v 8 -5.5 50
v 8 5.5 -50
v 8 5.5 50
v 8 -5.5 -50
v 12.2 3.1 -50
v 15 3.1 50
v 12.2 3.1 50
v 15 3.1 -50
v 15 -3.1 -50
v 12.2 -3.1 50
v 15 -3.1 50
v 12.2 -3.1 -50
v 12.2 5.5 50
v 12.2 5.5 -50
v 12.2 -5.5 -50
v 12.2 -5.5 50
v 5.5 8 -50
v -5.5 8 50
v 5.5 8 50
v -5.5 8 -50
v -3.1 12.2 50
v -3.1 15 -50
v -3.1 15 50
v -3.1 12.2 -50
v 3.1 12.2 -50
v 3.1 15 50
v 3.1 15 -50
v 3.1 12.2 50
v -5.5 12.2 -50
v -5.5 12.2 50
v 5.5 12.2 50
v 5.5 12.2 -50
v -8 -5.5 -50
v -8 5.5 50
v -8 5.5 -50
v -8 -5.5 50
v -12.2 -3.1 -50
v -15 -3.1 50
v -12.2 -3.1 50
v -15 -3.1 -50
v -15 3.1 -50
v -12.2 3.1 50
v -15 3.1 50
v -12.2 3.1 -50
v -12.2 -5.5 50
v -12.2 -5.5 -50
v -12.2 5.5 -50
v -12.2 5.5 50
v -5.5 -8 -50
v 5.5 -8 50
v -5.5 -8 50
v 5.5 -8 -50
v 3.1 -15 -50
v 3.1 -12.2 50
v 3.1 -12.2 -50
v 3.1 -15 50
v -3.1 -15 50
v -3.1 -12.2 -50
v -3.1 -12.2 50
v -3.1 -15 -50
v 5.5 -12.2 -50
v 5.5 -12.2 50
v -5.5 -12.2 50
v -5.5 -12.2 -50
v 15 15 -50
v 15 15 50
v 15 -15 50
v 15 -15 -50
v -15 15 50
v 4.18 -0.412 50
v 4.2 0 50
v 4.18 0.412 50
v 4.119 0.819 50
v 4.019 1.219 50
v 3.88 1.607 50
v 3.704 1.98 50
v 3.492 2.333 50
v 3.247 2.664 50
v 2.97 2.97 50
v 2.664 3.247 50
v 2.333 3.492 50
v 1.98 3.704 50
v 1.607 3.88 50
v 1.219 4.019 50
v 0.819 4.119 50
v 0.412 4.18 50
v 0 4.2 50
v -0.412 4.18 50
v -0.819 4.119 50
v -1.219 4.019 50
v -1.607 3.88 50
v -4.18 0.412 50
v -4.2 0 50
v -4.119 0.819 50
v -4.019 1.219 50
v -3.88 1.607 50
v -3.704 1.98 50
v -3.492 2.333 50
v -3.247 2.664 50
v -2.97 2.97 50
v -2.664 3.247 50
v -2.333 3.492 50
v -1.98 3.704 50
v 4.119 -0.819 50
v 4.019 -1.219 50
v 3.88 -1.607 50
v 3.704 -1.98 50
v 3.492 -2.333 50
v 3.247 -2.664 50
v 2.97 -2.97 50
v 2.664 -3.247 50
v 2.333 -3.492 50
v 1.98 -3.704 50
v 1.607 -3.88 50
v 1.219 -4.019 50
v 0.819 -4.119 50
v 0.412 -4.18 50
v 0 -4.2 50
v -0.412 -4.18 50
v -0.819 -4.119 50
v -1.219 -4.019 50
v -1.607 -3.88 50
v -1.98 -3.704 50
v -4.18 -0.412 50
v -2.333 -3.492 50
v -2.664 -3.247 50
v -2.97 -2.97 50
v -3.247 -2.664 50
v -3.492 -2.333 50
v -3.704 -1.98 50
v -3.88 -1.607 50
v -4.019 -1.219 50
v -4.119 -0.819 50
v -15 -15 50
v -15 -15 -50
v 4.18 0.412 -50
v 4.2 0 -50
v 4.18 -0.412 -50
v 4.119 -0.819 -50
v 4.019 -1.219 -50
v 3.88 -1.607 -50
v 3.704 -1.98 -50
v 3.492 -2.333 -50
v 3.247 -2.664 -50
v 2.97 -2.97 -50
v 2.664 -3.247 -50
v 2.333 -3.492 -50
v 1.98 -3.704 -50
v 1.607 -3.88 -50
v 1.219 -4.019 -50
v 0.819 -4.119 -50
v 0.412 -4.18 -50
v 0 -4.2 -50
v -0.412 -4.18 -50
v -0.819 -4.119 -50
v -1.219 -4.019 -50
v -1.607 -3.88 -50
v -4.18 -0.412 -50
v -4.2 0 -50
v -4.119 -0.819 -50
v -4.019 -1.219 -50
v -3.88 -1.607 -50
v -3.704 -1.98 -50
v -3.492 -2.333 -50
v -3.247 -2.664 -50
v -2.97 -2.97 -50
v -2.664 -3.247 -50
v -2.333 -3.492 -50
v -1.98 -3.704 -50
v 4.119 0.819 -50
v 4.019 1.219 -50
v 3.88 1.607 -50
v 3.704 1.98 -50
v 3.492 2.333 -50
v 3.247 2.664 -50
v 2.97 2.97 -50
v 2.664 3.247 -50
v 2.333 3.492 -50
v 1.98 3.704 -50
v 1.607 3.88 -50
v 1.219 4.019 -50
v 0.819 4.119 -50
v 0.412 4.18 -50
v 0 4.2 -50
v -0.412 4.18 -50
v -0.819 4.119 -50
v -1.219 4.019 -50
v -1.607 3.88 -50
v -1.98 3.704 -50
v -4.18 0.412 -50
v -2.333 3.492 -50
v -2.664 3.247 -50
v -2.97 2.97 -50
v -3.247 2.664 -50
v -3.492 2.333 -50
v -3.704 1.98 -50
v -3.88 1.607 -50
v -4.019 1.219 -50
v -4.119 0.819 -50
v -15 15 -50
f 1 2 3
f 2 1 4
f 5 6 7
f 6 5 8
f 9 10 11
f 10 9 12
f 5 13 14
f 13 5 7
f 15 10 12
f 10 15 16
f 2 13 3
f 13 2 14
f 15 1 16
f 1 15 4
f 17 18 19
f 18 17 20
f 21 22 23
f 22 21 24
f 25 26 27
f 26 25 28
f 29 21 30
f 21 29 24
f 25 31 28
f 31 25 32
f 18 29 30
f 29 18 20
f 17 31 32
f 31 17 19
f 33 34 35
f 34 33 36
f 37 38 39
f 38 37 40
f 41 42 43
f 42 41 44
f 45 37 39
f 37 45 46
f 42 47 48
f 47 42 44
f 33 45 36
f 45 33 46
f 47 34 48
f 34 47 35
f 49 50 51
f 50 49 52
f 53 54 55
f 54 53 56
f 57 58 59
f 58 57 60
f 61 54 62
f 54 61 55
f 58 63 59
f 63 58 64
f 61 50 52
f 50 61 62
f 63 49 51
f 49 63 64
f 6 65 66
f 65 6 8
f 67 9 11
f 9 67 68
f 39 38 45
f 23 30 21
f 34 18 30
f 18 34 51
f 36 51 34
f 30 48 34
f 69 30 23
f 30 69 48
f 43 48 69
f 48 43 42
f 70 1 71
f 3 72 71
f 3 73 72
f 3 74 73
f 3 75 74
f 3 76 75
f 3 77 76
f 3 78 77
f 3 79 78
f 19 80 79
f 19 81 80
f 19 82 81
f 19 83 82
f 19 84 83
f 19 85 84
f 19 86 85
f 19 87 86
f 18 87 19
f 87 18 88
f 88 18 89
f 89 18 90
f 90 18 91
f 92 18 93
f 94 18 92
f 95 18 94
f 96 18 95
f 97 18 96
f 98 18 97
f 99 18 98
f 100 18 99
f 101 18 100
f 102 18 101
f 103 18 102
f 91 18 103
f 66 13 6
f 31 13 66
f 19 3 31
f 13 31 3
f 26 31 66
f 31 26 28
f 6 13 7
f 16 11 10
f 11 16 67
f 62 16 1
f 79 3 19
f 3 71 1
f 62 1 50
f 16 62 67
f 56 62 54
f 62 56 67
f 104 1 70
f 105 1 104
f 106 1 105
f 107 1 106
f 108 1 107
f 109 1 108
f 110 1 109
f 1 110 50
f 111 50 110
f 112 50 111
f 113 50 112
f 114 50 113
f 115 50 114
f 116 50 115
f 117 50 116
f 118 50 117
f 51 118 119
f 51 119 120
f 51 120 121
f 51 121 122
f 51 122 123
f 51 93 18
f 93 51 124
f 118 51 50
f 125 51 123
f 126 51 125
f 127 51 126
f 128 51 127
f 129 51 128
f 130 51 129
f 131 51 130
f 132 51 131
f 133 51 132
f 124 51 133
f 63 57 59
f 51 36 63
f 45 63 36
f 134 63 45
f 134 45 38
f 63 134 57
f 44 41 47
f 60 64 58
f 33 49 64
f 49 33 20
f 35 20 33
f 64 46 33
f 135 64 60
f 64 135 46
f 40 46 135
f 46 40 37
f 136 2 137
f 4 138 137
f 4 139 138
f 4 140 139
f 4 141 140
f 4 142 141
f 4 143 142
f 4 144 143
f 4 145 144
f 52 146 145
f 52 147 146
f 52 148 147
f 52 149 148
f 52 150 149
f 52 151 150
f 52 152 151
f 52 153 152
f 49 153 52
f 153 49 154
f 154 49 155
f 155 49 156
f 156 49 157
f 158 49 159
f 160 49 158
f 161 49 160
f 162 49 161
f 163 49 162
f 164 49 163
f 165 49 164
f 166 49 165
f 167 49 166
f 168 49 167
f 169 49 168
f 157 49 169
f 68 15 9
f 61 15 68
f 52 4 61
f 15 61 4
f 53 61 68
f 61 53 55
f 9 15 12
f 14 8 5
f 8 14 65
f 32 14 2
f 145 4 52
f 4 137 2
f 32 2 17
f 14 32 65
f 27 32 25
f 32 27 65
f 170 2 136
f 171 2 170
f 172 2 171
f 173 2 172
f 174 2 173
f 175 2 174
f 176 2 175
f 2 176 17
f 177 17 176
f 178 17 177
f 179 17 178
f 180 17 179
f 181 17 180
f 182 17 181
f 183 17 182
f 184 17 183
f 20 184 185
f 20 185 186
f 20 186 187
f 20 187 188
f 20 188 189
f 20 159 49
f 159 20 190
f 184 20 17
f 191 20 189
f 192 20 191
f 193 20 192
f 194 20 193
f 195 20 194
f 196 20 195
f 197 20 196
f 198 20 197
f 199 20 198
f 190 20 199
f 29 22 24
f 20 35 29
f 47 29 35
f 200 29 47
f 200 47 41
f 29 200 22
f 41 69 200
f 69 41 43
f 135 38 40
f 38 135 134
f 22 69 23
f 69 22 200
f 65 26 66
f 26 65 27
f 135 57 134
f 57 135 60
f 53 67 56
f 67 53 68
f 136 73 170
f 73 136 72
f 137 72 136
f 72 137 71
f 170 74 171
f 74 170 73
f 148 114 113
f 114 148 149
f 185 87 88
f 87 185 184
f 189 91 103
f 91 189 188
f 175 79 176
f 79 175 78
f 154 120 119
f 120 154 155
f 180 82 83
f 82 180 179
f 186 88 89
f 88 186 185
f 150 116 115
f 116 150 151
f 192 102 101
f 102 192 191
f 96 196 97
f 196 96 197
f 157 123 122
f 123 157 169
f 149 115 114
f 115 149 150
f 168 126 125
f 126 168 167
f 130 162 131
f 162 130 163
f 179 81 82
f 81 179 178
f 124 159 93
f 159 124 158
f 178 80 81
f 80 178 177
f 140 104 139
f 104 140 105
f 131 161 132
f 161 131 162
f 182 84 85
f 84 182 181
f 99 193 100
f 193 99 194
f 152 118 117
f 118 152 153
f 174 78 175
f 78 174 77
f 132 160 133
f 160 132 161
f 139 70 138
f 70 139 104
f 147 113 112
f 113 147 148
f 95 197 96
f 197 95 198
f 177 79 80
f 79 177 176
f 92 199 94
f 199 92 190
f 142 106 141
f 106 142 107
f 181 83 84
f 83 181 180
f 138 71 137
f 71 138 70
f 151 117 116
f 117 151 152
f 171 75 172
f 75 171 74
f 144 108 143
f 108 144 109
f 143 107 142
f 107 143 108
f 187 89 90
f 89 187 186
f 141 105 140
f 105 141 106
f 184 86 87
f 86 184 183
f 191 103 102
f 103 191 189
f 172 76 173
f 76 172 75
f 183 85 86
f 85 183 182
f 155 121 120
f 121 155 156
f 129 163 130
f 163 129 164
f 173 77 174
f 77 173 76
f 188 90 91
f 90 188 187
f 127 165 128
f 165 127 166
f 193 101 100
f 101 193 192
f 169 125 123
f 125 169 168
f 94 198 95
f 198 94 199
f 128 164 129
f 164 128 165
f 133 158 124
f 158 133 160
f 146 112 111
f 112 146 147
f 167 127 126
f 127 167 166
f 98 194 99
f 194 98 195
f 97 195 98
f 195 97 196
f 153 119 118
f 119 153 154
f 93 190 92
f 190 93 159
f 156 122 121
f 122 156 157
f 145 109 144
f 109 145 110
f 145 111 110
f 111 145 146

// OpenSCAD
$fn = 64;

module t_slot_extrusion_3030(len=100, size=30) {
    // Simple 30x30 T-slot-like profile with 4 side slots + center bore.
    // All cuts are through the full length to ensure visible end-view features.
    eps = 0.2;

    half = size/2;

    // Slot geometry (approximate 3030)
    slot_depth = 7.0;          // how far the slot cuts in from the outer face
    slot_mouth = 6.2;          // opening at the outer face
    slot_inner = 11.0;         // wider cavity inside
    slot_inner_offset = 3.0;   // distance from outer face to start of inner widening

    // Center bore
    bore_r = 4.2;

    // Keep some wall thickness
    // (These values are chosen to avoid cutting through the outer walls/corners.)
    difference() {
        // Main body
        cube([size, size, len], center=true);

        // Center bore (through)
        cylinder(r=bore_r, h=len + 2*eps, center=true);

        // Four T-slots (through)
        for (a = [0, 90, 180, 270]) {
            rotate([0, 0, a]) {
                // Slot mouth: centered on +X face, cuts inward
                translate([half - slot_depth/2 + eps/2, 0, 0])
                    cube([slot_depth + eps, slot_mouth, len + 2*eps], center=true);

                // Inner cavity: starts a bit inside from the face, wider than mouth
                inner_depth = slot_depth - slot_inner_offset;
                translate([half - slot_inner_offset - inner_depth/2 + eps/2, 0, 0])
                    cube([inner_depth + eps, slot_inner, len + 2*eps], center=true);
            }
        }
    }
}

t_slot_extrusion_3030(len=100, size=30);
